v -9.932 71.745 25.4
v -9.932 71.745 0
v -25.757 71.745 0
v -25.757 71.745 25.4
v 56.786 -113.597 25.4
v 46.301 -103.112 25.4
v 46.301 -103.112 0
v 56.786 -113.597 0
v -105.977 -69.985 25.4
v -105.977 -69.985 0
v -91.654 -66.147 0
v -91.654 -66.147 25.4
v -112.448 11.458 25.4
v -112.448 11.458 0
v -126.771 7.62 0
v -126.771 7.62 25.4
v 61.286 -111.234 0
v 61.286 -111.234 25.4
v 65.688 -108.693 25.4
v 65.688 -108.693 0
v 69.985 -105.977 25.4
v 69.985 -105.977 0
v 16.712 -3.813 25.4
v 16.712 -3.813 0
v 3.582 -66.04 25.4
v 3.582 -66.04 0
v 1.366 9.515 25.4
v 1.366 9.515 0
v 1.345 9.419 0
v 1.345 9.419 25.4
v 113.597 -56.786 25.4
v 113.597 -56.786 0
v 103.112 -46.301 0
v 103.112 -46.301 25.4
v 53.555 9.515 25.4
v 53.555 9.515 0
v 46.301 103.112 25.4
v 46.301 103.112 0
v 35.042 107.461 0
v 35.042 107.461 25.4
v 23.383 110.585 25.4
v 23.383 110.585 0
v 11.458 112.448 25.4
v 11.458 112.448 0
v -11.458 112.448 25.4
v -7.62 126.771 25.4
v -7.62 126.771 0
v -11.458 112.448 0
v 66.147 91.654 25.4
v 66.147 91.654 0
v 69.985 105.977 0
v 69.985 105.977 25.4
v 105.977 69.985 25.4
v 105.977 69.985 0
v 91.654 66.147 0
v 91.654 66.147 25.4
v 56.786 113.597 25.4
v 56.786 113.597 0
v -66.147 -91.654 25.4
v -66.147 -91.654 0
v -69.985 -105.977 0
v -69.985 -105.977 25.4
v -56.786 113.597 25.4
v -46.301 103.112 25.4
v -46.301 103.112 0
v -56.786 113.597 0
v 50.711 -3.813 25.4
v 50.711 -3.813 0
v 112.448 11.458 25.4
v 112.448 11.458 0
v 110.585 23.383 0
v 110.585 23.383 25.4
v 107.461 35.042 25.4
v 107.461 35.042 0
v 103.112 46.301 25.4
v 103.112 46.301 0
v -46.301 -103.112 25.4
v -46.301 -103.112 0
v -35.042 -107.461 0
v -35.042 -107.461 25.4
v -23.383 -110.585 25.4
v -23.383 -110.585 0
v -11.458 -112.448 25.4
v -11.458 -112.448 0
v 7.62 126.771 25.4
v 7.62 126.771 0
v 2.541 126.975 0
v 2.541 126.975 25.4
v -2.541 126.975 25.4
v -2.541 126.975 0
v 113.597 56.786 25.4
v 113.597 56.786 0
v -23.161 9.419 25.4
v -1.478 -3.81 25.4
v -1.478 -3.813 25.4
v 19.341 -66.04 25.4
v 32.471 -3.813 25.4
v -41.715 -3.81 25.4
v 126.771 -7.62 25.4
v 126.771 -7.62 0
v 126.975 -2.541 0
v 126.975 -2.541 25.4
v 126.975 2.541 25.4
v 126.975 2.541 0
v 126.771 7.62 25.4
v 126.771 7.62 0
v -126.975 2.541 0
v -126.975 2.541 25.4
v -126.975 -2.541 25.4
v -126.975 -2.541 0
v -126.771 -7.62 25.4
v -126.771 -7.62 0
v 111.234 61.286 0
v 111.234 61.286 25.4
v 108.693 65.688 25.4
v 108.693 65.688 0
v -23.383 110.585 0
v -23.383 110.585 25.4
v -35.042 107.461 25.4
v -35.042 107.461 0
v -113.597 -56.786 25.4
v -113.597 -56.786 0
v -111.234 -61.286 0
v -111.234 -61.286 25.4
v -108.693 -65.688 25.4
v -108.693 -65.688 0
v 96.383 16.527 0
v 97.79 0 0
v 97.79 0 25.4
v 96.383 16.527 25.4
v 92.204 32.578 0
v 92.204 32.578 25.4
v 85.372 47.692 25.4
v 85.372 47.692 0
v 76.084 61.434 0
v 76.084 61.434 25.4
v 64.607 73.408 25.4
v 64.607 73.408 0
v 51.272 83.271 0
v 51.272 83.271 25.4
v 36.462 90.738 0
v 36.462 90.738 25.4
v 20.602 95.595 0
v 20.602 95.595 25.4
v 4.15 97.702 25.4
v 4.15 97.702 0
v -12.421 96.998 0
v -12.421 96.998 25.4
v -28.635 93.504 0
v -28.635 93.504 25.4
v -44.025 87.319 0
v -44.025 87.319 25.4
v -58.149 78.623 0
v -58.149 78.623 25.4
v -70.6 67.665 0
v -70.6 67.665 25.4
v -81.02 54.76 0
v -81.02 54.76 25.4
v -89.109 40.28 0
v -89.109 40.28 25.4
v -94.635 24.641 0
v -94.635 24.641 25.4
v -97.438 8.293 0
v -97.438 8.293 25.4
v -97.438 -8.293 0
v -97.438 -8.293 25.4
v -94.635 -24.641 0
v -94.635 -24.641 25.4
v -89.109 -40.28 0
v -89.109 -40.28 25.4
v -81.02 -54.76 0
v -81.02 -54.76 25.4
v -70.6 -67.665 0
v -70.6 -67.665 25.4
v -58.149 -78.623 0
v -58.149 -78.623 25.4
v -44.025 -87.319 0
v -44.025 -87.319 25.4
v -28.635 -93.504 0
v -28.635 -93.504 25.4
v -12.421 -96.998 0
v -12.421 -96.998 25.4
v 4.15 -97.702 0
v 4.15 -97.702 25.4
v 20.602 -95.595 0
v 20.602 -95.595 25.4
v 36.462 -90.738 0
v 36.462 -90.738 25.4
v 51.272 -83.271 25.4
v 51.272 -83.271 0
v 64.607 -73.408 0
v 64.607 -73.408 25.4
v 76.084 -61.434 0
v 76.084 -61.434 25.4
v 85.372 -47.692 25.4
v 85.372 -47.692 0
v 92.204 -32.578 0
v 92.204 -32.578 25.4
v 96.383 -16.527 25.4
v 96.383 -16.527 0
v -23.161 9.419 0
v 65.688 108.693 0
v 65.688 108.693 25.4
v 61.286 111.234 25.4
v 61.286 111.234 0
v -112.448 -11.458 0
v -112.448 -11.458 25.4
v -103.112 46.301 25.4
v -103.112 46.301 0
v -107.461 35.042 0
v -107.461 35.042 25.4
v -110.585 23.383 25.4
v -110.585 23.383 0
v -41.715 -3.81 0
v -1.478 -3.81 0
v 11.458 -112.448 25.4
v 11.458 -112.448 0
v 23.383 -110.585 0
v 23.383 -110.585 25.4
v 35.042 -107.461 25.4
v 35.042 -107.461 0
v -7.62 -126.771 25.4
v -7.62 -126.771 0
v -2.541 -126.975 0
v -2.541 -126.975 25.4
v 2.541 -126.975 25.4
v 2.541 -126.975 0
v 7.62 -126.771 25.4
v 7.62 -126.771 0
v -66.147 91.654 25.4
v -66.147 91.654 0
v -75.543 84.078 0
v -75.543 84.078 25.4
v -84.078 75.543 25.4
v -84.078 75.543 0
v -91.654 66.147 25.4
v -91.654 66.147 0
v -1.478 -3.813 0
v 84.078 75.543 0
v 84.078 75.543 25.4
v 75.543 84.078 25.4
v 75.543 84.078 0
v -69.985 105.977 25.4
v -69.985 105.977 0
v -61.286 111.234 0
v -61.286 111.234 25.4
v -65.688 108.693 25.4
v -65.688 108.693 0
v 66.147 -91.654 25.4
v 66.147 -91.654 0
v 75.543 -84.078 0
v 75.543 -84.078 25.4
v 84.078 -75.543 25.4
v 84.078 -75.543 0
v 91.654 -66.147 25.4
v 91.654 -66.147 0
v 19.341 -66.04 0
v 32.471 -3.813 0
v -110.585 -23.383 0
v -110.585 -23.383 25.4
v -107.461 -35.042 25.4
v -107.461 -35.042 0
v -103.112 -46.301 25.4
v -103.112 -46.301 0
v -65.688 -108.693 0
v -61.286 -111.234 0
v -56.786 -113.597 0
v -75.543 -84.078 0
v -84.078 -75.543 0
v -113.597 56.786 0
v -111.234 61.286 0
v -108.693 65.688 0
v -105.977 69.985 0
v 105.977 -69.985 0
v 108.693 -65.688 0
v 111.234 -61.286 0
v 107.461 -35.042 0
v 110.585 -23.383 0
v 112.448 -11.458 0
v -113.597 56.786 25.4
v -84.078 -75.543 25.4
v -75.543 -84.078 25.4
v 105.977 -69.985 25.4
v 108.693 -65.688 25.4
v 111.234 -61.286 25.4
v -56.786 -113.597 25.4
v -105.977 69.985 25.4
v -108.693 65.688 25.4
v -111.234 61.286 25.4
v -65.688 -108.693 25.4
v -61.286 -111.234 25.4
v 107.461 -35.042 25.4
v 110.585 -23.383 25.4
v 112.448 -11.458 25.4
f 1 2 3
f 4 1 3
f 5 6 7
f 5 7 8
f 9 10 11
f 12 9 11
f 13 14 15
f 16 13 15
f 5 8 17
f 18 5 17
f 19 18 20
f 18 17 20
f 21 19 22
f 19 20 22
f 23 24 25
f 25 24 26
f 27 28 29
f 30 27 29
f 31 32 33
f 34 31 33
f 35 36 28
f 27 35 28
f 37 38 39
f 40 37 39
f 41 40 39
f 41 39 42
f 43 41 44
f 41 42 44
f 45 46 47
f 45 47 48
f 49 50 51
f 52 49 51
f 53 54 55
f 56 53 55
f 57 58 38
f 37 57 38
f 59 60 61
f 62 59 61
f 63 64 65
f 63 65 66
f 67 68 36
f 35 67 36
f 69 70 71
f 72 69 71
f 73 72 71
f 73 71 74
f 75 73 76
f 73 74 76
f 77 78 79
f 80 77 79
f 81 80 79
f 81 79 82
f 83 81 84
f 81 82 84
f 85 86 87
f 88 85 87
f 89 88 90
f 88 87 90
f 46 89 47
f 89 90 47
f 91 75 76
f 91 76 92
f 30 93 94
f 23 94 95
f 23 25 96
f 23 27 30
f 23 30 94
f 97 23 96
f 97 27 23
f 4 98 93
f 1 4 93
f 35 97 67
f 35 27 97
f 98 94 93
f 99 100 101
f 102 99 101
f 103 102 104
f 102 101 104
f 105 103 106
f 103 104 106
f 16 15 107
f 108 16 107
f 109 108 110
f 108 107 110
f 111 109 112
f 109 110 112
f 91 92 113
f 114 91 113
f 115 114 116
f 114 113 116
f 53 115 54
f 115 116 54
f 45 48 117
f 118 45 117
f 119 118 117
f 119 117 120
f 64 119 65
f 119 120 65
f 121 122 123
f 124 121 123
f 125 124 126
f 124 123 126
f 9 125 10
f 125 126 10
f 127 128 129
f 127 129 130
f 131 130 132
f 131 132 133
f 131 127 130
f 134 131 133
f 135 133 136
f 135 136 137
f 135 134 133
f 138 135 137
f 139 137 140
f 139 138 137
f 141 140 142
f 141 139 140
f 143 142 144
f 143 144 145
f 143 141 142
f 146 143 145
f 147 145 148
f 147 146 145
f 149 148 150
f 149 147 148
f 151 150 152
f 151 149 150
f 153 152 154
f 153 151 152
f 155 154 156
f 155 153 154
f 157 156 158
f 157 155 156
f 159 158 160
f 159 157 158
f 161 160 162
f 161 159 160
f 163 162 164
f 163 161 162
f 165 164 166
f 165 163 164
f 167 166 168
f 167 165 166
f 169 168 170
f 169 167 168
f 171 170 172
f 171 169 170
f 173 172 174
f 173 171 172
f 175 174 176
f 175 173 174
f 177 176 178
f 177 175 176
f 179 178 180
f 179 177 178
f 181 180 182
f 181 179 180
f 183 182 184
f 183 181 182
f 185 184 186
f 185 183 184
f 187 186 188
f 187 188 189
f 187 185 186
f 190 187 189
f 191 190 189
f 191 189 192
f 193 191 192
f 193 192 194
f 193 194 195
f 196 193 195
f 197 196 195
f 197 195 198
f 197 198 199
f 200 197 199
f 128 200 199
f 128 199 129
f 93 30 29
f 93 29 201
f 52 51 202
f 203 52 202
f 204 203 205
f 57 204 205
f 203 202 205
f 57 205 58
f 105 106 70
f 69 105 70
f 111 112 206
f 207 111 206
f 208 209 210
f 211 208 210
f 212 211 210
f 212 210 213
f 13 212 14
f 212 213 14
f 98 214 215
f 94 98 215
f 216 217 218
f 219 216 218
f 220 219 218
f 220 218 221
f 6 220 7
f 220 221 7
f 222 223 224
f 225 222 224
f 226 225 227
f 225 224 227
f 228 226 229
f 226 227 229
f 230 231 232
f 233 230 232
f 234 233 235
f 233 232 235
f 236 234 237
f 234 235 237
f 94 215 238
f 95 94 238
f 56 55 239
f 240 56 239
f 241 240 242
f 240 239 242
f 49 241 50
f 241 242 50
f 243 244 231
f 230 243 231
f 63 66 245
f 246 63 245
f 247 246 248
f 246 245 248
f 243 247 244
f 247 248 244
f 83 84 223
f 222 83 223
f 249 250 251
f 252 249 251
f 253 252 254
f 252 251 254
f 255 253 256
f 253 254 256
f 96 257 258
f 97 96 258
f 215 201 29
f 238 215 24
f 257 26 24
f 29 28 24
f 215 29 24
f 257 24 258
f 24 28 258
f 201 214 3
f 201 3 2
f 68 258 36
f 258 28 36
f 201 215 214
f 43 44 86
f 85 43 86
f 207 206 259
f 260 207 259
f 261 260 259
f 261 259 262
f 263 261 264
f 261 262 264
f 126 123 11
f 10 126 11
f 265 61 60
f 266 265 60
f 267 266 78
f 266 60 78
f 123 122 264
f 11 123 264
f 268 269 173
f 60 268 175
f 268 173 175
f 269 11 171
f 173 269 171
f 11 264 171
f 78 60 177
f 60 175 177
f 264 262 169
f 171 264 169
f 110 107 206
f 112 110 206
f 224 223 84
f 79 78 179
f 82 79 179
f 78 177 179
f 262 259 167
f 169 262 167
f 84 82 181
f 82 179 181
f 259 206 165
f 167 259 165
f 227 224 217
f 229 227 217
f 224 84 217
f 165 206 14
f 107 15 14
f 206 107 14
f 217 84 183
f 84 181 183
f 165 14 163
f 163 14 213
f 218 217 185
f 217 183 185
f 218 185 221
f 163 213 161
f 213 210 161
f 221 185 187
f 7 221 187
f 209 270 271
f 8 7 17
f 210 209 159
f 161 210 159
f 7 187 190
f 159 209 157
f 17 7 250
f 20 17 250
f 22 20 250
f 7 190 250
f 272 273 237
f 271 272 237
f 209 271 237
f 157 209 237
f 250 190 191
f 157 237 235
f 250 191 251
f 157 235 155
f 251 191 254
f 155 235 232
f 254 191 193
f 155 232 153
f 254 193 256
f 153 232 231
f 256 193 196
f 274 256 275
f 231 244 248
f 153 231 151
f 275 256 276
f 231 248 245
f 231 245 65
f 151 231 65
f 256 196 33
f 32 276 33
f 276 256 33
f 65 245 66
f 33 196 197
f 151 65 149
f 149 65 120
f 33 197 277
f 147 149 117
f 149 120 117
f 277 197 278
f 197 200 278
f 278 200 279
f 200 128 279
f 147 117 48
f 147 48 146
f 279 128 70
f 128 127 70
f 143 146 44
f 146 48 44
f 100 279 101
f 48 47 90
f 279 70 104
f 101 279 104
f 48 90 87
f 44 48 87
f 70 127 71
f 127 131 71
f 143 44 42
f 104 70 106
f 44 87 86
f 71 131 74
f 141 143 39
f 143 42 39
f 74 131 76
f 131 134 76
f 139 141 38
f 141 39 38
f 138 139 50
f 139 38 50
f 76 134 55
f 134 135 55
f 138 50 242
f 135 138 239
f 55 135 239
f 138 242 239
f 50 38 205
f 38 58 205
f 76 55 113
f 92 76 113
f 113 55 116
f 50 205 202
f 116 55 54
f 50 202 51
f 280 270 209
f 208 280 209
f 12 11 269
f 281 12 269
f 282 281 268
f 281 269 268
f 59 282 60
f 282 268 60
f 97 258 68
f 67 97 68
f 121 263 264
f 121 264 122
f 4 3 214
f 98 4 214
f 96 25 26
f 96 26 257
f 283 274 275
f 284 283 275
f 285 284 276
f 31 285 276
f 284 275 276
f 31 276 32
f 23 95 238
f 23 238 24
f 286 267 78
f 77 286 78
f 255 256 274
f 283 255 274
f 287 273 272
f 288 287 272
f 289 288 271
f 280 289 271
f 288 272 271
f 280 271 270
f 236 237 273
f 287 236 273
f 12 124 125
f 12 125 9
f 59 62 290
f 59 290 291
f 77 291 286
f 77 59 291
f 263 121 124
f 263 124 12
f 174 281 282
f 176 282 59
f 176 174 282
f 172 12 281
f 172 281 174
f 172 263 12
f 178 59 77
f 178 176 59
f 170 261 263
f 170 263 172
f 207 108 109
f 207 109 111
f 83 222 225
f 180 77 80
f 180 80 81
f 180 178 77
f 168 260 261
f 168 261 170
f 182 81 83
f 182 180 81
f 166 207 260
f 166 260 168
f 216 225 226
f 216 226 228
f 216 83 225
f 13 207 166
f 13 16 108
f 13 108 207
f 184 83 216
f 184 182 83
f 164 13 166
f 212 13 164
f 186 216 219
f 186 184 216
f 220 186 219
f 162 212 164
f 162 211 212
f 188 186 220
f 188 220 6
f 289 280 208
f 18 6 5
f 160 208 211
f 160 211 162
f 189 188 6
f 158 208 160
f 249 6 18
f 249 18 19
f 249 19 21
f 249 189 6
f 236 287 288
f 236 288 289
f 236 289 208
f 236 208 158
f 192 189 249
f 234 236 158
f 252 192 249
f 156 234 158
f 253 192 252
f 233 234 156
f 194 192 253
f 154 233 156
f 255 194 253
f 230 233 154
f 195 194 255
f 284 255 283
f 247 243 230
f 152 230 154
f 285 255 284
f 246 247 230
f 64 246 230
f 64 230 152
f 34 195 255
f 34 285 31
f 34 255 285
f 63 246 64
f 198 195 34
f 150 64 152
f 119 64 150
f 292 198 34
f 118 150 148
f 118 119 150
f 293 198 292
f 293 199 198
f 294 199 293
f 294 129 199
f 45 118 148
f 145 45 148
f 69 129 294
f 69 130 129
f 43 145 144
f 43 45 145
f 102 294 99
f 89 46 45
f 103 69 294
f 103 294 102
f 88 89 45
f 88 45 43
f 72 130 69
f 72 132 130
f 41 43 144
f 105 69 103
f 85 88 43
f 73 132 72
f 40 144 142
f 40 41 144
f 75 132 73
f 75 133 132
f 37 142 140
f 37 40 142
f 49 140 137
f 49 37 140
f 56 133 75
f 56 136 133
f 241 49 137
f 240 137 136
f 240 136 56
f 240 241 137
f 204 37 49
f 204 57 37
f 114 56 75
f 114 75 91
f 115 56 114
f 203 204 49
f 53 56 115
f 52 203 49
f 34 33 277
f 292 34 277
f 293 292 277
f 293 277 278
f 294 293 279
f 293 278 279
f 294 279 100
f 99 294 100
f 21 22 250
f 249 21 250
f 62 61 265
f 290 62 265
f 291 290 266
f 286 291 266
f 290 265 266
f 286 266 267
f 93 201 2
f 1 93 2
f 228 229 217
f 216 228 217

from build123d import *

# Parameters (mm, degrees)
F0_R     = 97.79
F1_DEPTH = 25.4
F3_DEPTH = 25.4


with BuildPart() as f1:
    # F0 (on Top) → F1 (new body)
    with BuildSketch(Plane.XY):
        with BuildLine():
            Line((11.4579556123, 112.4477485465), (7.62, 126.7711938888))
            ThreePointArc((7.62, 126.7711938888), (0, 127), (-7.62, 126.7711938888))
            Line((-7.62, 126.7711938888), (-11.4579556123, 112.4477485465))
            ThreePointArc((-11.4579556123, 112.4477485465), (-29.2543166679, 109.1785961455), (-46.3009936376, 103.1115846458))
            ThreePointArc((-46.3009936376, 103.1115846458), (-56.515, 97.8868513898), (-66.146754909, 91.6536290335))
            ThreePointArc((-66.146754909, 91.6536290335), (-79.9242794775, 79.9242794775), (-91.6536290335, 66.146754909))
            ThreePointArc((-91.6536290335, 66.146754909), (-97.8868513898, 56.515), (-103.1115846458, 46.3009936376))
            ThreePointArc((-103.1115846458, 46.3009936376), (-109.1785961455, 29.2543166679), (-112.4477485465, 11.4579556123))
            ThreePointArc((-112.4477485465, 11.4579556123), (-113.03, 0), (-112.4477485465, -11.4579556123))
            ThreePointArc((-112.4477485465, -11.4579556123), (-109.1785961455, -29.2543166679), (-103.1115846458, -46.3009936376))
            ThreePointArc((-103.1115846458, -46.3009936376), (-97.8868513898, -56.515), (-91.6536290335, -66.146754909))
            ThreePointArc((-91.6536290335, -66.146754909), (-79.9242794775, -79.9242794775), (-66.146754909, -91.6536290335))
            ThreePointArc((-66.146754909, -91.6536290335), (-56.515, -97.8868513898), (-46.3009936376, -103.1115846458))
            ThreePointArc((-46.3009936376, -103.1115846458), (-29.2543166679, -109.1785961455), (-11.4579556123, -112.4477485465))
            ThreePointArc((-11.4579556123, -112.4477485465), (0, -113.03), (11.4579556123, -112.4477485465))
            ThreePointArc((11.4579556123, -112.4477485465), (29.2543166679, -109.1785961455), (46.3009936376, -103.1115846458))
            ThreePointArc((46.3009936376, -103.1115846458), (56.515, -97.8868513898), (66.146754909, -91.6536290335))
            ThreePointArc((66.146754909, -91.6536290335), (79.9242794775, -79.9242794775), (91.6536290335, -66.146754909))
            ThreePointArc((91.6536290335, -66.146754909), (97.8868513898, -56.515), (103.1115846458, -46.3009936376))
            ThreePointArc((103.1115846458, -46.3009936376), (109.1785961455, -29.2543166679), (112.4477485465, -11.4579556123))
            ThreePointArc((112.4477485465, -11.4579556123), (113.03, 0), (112.4477485465, 11.4579556123))
            ThreePointArc((112.4477485465, 11.4579556123), (109.1785961455, 29.2543166679), (103.1115846458, 46.3009936376))
            ThreePointArc((103.1115846458, 46.3009936376), (97.8868513898, 56.515), (91.6536290335, 66.146754909))
            ThreePointArc((91.6536290335, 66.146754909), (79.9242794775, 79.9242794775), (66.146754909, 91.6536290335))
            ThreePointArc((66.146754909, 91.6536290335), (56.515, 97.8868513898), (46.3009936376, 103.1115846458))
            ThreePointArc((46.3009936376, 103.1115846458), (29.2543166679, 109.1785961455), (11.4579556123, 112.4477485465))
        make_face()
        Circle(F0_R, mode=Mode.SUBTRACT)
        with BuildLine():
            Line((56.7864833676, 113.5970743758), (46.3009936376, 103.1115846458))
            ThreePointArc((46.3009936376, 103.1115846458), (56.515, 97.8868513898), (66.146754909, 91.6536290335))
            Line((66.146754909, 91.6536290335), (69.9847105213, 105.9770743758))
            ThreePointArc((69.9847105213, 105.9770743758), (63.5, 109.9852262806), (56.7864833676, 113.5970743758))
        make_face()
        with BuildLine():
            ThreePointArc((-66.146754909, 91.6536290335), (-56.515, 97.8868513898), (-46.3009936376, 103.1115846458))
            Line((-46.3009936376, 103.1115846458), (-56.7864833676, 113.5970743758))
            ThreePointArc((-56.7864833676, 113.5970743758), (-63.5, 109.9852262806), (-69.9847105213, 105.9770743758))
            Line((-69.9847105213, 105.9770743758), (-66.146754909, 91.6536290335))
        make_face()
        with BuildLine():
            Line((105.9770743758, 69.9847105213), (91.6536290335, 66.146754909))
            ThreePointArc((91.6536290335, 66.146754909), (97.8868513898, 56.515), (103.1115846458, 46.3009936376))
            Line((103.1115846458, 46.3009936376), (113.5970743758, 56.7864833676))
            ThreePointArc((113.5970743758, 56.7864833676), (109.9852262806, 63.5), (105.9770743758, 69.9847105213))
        make_face()
        with BuildLine():
            ThreePointArc((-103.1115846458, 46.3009936376), (-97.8868513898, 56.515), (-91.6536290335, 66.146754909))
            Line((-91.6536290335, 66.146754909), (-105.9770743758, 69.9847105213))
            ThreePointArc((-105.9770743758, 69.9847105213), (-109.9852262806, 63.5), (-113.5970743758, 56.7864833676))
            Line((-113.5970743758, 56.7864833676), (-103.1115846458, 46.3009936376))
        make_face()
        with BuildLine():
            Line((126.7711938888, 7.62), (112.4477485465, 11.4579556123))
            ThreePointArc((112.4477485465, 11.4579556123), (113.03, 0), (112.4477485465, -11.4579556123))
            Line((112.4477485465, -11.4579556123), (126.7711938888, -7.62))
            ThreePointArc((126.7711938888, -7.62), (127, 0), (126.7711938888, 7.62))
        make_face()
        with BuildLine():
            ThreePointArc((-112.4477485465, -11.4579556123), (-113.03, 0), (-112.4477485465, 11.4579556123))
            Line((-112.4477485465, 11.4579556123), (-126.7711938888, 7.62))
            ThreePointArc((-126.7711938888, 7.62), (-127, 0), (-126.7711938888, -7.62))
            Line((-126.7711938888, -7.62), (-112.4477485465, -11.4579556123))
        make_face()
        with BuildLine():
            Line((113.5970743758, -56.7864833676), (103.1115846458, -46.3009936376))
            ThreePointArc((103.1115846458, -46.3009936376), (97.8868513898, -56.515), (91.6536290335, -66.146754909))
            Line((91.6536290335, -66.146754909), (105.9770743758, -69.9847105213))
            ThreePointArc((105.9770743758, -69.9847105213), (109.9852262806, -63.5), (113.5970743758, -56.7864833676))
        make_face()
        with BuildLine():
            ThreePointArc((-91.6536290335, -66.146754909), (-97.8868513898, -56.515), (-103.1115846458, -46.3009936376))
            Line((-103.1115846458, -46.3009936376), (-113.5970743758, -56.7864833676))
            ThreePointArc((-113.5970743758, -56.7864833676), (-109.9852262806, -63.5), (-105.9770743758, -69.9847105213))
            Line((-105.9770743758, -69.9847105213), (-91.6536290335, -66.146754909))
        make_face()
        with BuildLine():
            Line((69.9847105213, -105.9770743758), (66.146754909, -91.6536290335))
            ThreePointArc((66.146754909, -91.6536290335), (56.515, -97.8868513898), (46.3009936376, -103.1115846458))
            Line((46.3009936376, -103.1115846458), (56.7864833676, -113.5970743758))
            ThreePointArc((56.7864833676, -113.5970743758), (63.5, -109.9852262806), (69.9847105213, -105.9770743758))
        make_face()
        with BuildLine():
            ThreePointArc((-46.3009936376, -103.1115846458), (-56.515, -97.8868513898), (-66.146754909, -91.6536290335))
            Line((-66.146754909, -91.6536290335), (-69.9847105213, -105.9770743758))
            ThreePointArc((-69.9847105213, -105.9770743758), (-63.5, -109.9852262806), (-56.7864833676, -113.5970743758))
            Line((-56.7864833676, -113.5970743758), (-46.3009936376, -103.1115846458))
        make_face()
        with BuildLine():
            Line((7.62, -126.7711938888), (11.4579556123, -112.4477485465))
            ThreePointArc((11.4579556123, -112.4477485465), (0, -113.03), (-11.4579556123, -112.4477485465))
            Line((-11.4579556123, -112.4477485465), (-7.62, -126.7711938888))
            ThreePointArc((-7.62, -126.7711938888), (0, -127), (7.62, -126.7711938888))
        make_face()
    extrude(amount=F1_DEPTH)


with BuildPart() as f3:
    # F2 (on Top) → F3 (new body)
    with BuildSketch(Plane.XY):
        Polygon((-25.7571875, 71.745078125), (-41.7148697917, -3.81), (-1.4776536006, -3.81), (1.3454440007, 9.4191666667), (-23.1609635417, 9.4191666667), (-9.931796875, 71.745078125), align=None)
        Polygon((1.3454440007, 9.4191666667), (-1.4776536006, -3.81), (0.5027083333, -3.81), (3.2973697917, 9.4191666667), align=None)
        Polygon((0.5027083333, -3.81), (-1.4776536006, -3.81), (-1.478359375, -3.8133072917), (16.7117447917, -3.8133072917), (3.581796875, -66.04), (19.3410416667, -66.04), (32.4709895833, -3.8133072917), (50.710703125, -3.8133072917), (53.5549739583, 9.515078125), (1.3659114583, 9.515078125), (1.3454440007, 9.4191666667), (3.2973697917, 9.4191666667), align=None)
    extrude(amount=F3_DEPTH)


solid = Compound([f1.part, f3.part])
